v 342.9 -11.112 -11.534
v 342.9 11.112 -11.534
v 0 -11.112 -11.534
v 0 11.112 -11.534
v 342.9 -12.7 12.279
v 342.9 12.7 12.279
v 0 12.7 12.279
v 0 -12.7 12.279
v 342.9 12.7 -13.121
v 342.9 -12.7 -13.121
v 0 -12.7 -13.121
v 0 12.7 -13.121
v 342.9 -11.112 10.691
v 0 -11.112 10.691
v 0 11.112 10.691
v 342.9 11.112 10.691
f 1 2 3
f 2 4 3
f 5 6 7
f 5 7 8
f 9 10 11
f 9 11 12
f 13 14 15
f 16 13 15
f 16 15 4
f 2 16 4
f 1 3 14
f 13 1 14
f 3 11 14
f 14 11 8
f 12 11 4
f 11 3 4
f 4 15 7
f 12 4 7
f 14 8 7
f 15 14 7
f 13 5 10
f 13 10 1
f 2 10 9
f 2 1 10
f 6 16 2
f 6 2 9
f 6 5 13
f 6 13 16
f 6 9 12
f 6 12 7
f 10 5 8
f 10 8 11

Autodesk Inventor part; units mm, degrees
ref_plane "YZ Plane" through (0, 0, 0) normal (1, 0, 0) x (0, 1, 0)
ref_plane "XZ Plane" through (0, 0, 0) normal (0, 1, 0) x (-1, 0, 0)
ref_plane "XY Plane" through (0, 0, 0) normal (0, 0, 1) x (1, 0, 0)
sketch "Sketch1" plane through (0, 0, 0) normal (1, 0, 0) x (0, 1, 0)
  line L0 (12.7, 12.2788) -> (-12.7, 12.2788)
  line L1 (-12.7, 12.2788) -> (-12.7, -13.1212)
  line L2 (-12.7, -13.1212) -> (12.7, -13.1212)
  line L3 (12.7, -13.1212) -> (12.7, 12.2788)
  line L4 (0, 32.4321) -> (0, -31.5519)
  line L5 (24.3369, 0) -> (-19.9975, 0)
  line L6 (11.1125, -11.5337) -> (-11.1125, -11.5337)
  line L7 (-11.1125, -11.5337) -> (-11.1125, 10.6913)
  line L8 (-11.1125, 10.6913) -> (11.1125, 10.6913)
  line L9 (11.1125, 10.6913) -> (11.1125, -11.5337)
  point P0 (0, 0)
  dimension "d0" = 25.4
  dimension "d24" = 1.5875
  dimension "d25" = 1.5875
  dimension "d26" = 1.5875
  dimension "d27" = 1.5875
extrude "Extrusion1" add sketch "Sketch1" along normal blind 342.9 contours L3 L5 L9 L8 L4 L0 | L4 L8 L7 L5 L1 L0 | L3 L2 L4 L6 L9 L5 | L5 L7 L6 L4 L2 L1
equation "\"d25\" = d24"
equation "\"d26\" = d24"
equation "\"d27\" = d26"
properties part number "Part1-17-13.31255in" material "Aluminum 6061"
